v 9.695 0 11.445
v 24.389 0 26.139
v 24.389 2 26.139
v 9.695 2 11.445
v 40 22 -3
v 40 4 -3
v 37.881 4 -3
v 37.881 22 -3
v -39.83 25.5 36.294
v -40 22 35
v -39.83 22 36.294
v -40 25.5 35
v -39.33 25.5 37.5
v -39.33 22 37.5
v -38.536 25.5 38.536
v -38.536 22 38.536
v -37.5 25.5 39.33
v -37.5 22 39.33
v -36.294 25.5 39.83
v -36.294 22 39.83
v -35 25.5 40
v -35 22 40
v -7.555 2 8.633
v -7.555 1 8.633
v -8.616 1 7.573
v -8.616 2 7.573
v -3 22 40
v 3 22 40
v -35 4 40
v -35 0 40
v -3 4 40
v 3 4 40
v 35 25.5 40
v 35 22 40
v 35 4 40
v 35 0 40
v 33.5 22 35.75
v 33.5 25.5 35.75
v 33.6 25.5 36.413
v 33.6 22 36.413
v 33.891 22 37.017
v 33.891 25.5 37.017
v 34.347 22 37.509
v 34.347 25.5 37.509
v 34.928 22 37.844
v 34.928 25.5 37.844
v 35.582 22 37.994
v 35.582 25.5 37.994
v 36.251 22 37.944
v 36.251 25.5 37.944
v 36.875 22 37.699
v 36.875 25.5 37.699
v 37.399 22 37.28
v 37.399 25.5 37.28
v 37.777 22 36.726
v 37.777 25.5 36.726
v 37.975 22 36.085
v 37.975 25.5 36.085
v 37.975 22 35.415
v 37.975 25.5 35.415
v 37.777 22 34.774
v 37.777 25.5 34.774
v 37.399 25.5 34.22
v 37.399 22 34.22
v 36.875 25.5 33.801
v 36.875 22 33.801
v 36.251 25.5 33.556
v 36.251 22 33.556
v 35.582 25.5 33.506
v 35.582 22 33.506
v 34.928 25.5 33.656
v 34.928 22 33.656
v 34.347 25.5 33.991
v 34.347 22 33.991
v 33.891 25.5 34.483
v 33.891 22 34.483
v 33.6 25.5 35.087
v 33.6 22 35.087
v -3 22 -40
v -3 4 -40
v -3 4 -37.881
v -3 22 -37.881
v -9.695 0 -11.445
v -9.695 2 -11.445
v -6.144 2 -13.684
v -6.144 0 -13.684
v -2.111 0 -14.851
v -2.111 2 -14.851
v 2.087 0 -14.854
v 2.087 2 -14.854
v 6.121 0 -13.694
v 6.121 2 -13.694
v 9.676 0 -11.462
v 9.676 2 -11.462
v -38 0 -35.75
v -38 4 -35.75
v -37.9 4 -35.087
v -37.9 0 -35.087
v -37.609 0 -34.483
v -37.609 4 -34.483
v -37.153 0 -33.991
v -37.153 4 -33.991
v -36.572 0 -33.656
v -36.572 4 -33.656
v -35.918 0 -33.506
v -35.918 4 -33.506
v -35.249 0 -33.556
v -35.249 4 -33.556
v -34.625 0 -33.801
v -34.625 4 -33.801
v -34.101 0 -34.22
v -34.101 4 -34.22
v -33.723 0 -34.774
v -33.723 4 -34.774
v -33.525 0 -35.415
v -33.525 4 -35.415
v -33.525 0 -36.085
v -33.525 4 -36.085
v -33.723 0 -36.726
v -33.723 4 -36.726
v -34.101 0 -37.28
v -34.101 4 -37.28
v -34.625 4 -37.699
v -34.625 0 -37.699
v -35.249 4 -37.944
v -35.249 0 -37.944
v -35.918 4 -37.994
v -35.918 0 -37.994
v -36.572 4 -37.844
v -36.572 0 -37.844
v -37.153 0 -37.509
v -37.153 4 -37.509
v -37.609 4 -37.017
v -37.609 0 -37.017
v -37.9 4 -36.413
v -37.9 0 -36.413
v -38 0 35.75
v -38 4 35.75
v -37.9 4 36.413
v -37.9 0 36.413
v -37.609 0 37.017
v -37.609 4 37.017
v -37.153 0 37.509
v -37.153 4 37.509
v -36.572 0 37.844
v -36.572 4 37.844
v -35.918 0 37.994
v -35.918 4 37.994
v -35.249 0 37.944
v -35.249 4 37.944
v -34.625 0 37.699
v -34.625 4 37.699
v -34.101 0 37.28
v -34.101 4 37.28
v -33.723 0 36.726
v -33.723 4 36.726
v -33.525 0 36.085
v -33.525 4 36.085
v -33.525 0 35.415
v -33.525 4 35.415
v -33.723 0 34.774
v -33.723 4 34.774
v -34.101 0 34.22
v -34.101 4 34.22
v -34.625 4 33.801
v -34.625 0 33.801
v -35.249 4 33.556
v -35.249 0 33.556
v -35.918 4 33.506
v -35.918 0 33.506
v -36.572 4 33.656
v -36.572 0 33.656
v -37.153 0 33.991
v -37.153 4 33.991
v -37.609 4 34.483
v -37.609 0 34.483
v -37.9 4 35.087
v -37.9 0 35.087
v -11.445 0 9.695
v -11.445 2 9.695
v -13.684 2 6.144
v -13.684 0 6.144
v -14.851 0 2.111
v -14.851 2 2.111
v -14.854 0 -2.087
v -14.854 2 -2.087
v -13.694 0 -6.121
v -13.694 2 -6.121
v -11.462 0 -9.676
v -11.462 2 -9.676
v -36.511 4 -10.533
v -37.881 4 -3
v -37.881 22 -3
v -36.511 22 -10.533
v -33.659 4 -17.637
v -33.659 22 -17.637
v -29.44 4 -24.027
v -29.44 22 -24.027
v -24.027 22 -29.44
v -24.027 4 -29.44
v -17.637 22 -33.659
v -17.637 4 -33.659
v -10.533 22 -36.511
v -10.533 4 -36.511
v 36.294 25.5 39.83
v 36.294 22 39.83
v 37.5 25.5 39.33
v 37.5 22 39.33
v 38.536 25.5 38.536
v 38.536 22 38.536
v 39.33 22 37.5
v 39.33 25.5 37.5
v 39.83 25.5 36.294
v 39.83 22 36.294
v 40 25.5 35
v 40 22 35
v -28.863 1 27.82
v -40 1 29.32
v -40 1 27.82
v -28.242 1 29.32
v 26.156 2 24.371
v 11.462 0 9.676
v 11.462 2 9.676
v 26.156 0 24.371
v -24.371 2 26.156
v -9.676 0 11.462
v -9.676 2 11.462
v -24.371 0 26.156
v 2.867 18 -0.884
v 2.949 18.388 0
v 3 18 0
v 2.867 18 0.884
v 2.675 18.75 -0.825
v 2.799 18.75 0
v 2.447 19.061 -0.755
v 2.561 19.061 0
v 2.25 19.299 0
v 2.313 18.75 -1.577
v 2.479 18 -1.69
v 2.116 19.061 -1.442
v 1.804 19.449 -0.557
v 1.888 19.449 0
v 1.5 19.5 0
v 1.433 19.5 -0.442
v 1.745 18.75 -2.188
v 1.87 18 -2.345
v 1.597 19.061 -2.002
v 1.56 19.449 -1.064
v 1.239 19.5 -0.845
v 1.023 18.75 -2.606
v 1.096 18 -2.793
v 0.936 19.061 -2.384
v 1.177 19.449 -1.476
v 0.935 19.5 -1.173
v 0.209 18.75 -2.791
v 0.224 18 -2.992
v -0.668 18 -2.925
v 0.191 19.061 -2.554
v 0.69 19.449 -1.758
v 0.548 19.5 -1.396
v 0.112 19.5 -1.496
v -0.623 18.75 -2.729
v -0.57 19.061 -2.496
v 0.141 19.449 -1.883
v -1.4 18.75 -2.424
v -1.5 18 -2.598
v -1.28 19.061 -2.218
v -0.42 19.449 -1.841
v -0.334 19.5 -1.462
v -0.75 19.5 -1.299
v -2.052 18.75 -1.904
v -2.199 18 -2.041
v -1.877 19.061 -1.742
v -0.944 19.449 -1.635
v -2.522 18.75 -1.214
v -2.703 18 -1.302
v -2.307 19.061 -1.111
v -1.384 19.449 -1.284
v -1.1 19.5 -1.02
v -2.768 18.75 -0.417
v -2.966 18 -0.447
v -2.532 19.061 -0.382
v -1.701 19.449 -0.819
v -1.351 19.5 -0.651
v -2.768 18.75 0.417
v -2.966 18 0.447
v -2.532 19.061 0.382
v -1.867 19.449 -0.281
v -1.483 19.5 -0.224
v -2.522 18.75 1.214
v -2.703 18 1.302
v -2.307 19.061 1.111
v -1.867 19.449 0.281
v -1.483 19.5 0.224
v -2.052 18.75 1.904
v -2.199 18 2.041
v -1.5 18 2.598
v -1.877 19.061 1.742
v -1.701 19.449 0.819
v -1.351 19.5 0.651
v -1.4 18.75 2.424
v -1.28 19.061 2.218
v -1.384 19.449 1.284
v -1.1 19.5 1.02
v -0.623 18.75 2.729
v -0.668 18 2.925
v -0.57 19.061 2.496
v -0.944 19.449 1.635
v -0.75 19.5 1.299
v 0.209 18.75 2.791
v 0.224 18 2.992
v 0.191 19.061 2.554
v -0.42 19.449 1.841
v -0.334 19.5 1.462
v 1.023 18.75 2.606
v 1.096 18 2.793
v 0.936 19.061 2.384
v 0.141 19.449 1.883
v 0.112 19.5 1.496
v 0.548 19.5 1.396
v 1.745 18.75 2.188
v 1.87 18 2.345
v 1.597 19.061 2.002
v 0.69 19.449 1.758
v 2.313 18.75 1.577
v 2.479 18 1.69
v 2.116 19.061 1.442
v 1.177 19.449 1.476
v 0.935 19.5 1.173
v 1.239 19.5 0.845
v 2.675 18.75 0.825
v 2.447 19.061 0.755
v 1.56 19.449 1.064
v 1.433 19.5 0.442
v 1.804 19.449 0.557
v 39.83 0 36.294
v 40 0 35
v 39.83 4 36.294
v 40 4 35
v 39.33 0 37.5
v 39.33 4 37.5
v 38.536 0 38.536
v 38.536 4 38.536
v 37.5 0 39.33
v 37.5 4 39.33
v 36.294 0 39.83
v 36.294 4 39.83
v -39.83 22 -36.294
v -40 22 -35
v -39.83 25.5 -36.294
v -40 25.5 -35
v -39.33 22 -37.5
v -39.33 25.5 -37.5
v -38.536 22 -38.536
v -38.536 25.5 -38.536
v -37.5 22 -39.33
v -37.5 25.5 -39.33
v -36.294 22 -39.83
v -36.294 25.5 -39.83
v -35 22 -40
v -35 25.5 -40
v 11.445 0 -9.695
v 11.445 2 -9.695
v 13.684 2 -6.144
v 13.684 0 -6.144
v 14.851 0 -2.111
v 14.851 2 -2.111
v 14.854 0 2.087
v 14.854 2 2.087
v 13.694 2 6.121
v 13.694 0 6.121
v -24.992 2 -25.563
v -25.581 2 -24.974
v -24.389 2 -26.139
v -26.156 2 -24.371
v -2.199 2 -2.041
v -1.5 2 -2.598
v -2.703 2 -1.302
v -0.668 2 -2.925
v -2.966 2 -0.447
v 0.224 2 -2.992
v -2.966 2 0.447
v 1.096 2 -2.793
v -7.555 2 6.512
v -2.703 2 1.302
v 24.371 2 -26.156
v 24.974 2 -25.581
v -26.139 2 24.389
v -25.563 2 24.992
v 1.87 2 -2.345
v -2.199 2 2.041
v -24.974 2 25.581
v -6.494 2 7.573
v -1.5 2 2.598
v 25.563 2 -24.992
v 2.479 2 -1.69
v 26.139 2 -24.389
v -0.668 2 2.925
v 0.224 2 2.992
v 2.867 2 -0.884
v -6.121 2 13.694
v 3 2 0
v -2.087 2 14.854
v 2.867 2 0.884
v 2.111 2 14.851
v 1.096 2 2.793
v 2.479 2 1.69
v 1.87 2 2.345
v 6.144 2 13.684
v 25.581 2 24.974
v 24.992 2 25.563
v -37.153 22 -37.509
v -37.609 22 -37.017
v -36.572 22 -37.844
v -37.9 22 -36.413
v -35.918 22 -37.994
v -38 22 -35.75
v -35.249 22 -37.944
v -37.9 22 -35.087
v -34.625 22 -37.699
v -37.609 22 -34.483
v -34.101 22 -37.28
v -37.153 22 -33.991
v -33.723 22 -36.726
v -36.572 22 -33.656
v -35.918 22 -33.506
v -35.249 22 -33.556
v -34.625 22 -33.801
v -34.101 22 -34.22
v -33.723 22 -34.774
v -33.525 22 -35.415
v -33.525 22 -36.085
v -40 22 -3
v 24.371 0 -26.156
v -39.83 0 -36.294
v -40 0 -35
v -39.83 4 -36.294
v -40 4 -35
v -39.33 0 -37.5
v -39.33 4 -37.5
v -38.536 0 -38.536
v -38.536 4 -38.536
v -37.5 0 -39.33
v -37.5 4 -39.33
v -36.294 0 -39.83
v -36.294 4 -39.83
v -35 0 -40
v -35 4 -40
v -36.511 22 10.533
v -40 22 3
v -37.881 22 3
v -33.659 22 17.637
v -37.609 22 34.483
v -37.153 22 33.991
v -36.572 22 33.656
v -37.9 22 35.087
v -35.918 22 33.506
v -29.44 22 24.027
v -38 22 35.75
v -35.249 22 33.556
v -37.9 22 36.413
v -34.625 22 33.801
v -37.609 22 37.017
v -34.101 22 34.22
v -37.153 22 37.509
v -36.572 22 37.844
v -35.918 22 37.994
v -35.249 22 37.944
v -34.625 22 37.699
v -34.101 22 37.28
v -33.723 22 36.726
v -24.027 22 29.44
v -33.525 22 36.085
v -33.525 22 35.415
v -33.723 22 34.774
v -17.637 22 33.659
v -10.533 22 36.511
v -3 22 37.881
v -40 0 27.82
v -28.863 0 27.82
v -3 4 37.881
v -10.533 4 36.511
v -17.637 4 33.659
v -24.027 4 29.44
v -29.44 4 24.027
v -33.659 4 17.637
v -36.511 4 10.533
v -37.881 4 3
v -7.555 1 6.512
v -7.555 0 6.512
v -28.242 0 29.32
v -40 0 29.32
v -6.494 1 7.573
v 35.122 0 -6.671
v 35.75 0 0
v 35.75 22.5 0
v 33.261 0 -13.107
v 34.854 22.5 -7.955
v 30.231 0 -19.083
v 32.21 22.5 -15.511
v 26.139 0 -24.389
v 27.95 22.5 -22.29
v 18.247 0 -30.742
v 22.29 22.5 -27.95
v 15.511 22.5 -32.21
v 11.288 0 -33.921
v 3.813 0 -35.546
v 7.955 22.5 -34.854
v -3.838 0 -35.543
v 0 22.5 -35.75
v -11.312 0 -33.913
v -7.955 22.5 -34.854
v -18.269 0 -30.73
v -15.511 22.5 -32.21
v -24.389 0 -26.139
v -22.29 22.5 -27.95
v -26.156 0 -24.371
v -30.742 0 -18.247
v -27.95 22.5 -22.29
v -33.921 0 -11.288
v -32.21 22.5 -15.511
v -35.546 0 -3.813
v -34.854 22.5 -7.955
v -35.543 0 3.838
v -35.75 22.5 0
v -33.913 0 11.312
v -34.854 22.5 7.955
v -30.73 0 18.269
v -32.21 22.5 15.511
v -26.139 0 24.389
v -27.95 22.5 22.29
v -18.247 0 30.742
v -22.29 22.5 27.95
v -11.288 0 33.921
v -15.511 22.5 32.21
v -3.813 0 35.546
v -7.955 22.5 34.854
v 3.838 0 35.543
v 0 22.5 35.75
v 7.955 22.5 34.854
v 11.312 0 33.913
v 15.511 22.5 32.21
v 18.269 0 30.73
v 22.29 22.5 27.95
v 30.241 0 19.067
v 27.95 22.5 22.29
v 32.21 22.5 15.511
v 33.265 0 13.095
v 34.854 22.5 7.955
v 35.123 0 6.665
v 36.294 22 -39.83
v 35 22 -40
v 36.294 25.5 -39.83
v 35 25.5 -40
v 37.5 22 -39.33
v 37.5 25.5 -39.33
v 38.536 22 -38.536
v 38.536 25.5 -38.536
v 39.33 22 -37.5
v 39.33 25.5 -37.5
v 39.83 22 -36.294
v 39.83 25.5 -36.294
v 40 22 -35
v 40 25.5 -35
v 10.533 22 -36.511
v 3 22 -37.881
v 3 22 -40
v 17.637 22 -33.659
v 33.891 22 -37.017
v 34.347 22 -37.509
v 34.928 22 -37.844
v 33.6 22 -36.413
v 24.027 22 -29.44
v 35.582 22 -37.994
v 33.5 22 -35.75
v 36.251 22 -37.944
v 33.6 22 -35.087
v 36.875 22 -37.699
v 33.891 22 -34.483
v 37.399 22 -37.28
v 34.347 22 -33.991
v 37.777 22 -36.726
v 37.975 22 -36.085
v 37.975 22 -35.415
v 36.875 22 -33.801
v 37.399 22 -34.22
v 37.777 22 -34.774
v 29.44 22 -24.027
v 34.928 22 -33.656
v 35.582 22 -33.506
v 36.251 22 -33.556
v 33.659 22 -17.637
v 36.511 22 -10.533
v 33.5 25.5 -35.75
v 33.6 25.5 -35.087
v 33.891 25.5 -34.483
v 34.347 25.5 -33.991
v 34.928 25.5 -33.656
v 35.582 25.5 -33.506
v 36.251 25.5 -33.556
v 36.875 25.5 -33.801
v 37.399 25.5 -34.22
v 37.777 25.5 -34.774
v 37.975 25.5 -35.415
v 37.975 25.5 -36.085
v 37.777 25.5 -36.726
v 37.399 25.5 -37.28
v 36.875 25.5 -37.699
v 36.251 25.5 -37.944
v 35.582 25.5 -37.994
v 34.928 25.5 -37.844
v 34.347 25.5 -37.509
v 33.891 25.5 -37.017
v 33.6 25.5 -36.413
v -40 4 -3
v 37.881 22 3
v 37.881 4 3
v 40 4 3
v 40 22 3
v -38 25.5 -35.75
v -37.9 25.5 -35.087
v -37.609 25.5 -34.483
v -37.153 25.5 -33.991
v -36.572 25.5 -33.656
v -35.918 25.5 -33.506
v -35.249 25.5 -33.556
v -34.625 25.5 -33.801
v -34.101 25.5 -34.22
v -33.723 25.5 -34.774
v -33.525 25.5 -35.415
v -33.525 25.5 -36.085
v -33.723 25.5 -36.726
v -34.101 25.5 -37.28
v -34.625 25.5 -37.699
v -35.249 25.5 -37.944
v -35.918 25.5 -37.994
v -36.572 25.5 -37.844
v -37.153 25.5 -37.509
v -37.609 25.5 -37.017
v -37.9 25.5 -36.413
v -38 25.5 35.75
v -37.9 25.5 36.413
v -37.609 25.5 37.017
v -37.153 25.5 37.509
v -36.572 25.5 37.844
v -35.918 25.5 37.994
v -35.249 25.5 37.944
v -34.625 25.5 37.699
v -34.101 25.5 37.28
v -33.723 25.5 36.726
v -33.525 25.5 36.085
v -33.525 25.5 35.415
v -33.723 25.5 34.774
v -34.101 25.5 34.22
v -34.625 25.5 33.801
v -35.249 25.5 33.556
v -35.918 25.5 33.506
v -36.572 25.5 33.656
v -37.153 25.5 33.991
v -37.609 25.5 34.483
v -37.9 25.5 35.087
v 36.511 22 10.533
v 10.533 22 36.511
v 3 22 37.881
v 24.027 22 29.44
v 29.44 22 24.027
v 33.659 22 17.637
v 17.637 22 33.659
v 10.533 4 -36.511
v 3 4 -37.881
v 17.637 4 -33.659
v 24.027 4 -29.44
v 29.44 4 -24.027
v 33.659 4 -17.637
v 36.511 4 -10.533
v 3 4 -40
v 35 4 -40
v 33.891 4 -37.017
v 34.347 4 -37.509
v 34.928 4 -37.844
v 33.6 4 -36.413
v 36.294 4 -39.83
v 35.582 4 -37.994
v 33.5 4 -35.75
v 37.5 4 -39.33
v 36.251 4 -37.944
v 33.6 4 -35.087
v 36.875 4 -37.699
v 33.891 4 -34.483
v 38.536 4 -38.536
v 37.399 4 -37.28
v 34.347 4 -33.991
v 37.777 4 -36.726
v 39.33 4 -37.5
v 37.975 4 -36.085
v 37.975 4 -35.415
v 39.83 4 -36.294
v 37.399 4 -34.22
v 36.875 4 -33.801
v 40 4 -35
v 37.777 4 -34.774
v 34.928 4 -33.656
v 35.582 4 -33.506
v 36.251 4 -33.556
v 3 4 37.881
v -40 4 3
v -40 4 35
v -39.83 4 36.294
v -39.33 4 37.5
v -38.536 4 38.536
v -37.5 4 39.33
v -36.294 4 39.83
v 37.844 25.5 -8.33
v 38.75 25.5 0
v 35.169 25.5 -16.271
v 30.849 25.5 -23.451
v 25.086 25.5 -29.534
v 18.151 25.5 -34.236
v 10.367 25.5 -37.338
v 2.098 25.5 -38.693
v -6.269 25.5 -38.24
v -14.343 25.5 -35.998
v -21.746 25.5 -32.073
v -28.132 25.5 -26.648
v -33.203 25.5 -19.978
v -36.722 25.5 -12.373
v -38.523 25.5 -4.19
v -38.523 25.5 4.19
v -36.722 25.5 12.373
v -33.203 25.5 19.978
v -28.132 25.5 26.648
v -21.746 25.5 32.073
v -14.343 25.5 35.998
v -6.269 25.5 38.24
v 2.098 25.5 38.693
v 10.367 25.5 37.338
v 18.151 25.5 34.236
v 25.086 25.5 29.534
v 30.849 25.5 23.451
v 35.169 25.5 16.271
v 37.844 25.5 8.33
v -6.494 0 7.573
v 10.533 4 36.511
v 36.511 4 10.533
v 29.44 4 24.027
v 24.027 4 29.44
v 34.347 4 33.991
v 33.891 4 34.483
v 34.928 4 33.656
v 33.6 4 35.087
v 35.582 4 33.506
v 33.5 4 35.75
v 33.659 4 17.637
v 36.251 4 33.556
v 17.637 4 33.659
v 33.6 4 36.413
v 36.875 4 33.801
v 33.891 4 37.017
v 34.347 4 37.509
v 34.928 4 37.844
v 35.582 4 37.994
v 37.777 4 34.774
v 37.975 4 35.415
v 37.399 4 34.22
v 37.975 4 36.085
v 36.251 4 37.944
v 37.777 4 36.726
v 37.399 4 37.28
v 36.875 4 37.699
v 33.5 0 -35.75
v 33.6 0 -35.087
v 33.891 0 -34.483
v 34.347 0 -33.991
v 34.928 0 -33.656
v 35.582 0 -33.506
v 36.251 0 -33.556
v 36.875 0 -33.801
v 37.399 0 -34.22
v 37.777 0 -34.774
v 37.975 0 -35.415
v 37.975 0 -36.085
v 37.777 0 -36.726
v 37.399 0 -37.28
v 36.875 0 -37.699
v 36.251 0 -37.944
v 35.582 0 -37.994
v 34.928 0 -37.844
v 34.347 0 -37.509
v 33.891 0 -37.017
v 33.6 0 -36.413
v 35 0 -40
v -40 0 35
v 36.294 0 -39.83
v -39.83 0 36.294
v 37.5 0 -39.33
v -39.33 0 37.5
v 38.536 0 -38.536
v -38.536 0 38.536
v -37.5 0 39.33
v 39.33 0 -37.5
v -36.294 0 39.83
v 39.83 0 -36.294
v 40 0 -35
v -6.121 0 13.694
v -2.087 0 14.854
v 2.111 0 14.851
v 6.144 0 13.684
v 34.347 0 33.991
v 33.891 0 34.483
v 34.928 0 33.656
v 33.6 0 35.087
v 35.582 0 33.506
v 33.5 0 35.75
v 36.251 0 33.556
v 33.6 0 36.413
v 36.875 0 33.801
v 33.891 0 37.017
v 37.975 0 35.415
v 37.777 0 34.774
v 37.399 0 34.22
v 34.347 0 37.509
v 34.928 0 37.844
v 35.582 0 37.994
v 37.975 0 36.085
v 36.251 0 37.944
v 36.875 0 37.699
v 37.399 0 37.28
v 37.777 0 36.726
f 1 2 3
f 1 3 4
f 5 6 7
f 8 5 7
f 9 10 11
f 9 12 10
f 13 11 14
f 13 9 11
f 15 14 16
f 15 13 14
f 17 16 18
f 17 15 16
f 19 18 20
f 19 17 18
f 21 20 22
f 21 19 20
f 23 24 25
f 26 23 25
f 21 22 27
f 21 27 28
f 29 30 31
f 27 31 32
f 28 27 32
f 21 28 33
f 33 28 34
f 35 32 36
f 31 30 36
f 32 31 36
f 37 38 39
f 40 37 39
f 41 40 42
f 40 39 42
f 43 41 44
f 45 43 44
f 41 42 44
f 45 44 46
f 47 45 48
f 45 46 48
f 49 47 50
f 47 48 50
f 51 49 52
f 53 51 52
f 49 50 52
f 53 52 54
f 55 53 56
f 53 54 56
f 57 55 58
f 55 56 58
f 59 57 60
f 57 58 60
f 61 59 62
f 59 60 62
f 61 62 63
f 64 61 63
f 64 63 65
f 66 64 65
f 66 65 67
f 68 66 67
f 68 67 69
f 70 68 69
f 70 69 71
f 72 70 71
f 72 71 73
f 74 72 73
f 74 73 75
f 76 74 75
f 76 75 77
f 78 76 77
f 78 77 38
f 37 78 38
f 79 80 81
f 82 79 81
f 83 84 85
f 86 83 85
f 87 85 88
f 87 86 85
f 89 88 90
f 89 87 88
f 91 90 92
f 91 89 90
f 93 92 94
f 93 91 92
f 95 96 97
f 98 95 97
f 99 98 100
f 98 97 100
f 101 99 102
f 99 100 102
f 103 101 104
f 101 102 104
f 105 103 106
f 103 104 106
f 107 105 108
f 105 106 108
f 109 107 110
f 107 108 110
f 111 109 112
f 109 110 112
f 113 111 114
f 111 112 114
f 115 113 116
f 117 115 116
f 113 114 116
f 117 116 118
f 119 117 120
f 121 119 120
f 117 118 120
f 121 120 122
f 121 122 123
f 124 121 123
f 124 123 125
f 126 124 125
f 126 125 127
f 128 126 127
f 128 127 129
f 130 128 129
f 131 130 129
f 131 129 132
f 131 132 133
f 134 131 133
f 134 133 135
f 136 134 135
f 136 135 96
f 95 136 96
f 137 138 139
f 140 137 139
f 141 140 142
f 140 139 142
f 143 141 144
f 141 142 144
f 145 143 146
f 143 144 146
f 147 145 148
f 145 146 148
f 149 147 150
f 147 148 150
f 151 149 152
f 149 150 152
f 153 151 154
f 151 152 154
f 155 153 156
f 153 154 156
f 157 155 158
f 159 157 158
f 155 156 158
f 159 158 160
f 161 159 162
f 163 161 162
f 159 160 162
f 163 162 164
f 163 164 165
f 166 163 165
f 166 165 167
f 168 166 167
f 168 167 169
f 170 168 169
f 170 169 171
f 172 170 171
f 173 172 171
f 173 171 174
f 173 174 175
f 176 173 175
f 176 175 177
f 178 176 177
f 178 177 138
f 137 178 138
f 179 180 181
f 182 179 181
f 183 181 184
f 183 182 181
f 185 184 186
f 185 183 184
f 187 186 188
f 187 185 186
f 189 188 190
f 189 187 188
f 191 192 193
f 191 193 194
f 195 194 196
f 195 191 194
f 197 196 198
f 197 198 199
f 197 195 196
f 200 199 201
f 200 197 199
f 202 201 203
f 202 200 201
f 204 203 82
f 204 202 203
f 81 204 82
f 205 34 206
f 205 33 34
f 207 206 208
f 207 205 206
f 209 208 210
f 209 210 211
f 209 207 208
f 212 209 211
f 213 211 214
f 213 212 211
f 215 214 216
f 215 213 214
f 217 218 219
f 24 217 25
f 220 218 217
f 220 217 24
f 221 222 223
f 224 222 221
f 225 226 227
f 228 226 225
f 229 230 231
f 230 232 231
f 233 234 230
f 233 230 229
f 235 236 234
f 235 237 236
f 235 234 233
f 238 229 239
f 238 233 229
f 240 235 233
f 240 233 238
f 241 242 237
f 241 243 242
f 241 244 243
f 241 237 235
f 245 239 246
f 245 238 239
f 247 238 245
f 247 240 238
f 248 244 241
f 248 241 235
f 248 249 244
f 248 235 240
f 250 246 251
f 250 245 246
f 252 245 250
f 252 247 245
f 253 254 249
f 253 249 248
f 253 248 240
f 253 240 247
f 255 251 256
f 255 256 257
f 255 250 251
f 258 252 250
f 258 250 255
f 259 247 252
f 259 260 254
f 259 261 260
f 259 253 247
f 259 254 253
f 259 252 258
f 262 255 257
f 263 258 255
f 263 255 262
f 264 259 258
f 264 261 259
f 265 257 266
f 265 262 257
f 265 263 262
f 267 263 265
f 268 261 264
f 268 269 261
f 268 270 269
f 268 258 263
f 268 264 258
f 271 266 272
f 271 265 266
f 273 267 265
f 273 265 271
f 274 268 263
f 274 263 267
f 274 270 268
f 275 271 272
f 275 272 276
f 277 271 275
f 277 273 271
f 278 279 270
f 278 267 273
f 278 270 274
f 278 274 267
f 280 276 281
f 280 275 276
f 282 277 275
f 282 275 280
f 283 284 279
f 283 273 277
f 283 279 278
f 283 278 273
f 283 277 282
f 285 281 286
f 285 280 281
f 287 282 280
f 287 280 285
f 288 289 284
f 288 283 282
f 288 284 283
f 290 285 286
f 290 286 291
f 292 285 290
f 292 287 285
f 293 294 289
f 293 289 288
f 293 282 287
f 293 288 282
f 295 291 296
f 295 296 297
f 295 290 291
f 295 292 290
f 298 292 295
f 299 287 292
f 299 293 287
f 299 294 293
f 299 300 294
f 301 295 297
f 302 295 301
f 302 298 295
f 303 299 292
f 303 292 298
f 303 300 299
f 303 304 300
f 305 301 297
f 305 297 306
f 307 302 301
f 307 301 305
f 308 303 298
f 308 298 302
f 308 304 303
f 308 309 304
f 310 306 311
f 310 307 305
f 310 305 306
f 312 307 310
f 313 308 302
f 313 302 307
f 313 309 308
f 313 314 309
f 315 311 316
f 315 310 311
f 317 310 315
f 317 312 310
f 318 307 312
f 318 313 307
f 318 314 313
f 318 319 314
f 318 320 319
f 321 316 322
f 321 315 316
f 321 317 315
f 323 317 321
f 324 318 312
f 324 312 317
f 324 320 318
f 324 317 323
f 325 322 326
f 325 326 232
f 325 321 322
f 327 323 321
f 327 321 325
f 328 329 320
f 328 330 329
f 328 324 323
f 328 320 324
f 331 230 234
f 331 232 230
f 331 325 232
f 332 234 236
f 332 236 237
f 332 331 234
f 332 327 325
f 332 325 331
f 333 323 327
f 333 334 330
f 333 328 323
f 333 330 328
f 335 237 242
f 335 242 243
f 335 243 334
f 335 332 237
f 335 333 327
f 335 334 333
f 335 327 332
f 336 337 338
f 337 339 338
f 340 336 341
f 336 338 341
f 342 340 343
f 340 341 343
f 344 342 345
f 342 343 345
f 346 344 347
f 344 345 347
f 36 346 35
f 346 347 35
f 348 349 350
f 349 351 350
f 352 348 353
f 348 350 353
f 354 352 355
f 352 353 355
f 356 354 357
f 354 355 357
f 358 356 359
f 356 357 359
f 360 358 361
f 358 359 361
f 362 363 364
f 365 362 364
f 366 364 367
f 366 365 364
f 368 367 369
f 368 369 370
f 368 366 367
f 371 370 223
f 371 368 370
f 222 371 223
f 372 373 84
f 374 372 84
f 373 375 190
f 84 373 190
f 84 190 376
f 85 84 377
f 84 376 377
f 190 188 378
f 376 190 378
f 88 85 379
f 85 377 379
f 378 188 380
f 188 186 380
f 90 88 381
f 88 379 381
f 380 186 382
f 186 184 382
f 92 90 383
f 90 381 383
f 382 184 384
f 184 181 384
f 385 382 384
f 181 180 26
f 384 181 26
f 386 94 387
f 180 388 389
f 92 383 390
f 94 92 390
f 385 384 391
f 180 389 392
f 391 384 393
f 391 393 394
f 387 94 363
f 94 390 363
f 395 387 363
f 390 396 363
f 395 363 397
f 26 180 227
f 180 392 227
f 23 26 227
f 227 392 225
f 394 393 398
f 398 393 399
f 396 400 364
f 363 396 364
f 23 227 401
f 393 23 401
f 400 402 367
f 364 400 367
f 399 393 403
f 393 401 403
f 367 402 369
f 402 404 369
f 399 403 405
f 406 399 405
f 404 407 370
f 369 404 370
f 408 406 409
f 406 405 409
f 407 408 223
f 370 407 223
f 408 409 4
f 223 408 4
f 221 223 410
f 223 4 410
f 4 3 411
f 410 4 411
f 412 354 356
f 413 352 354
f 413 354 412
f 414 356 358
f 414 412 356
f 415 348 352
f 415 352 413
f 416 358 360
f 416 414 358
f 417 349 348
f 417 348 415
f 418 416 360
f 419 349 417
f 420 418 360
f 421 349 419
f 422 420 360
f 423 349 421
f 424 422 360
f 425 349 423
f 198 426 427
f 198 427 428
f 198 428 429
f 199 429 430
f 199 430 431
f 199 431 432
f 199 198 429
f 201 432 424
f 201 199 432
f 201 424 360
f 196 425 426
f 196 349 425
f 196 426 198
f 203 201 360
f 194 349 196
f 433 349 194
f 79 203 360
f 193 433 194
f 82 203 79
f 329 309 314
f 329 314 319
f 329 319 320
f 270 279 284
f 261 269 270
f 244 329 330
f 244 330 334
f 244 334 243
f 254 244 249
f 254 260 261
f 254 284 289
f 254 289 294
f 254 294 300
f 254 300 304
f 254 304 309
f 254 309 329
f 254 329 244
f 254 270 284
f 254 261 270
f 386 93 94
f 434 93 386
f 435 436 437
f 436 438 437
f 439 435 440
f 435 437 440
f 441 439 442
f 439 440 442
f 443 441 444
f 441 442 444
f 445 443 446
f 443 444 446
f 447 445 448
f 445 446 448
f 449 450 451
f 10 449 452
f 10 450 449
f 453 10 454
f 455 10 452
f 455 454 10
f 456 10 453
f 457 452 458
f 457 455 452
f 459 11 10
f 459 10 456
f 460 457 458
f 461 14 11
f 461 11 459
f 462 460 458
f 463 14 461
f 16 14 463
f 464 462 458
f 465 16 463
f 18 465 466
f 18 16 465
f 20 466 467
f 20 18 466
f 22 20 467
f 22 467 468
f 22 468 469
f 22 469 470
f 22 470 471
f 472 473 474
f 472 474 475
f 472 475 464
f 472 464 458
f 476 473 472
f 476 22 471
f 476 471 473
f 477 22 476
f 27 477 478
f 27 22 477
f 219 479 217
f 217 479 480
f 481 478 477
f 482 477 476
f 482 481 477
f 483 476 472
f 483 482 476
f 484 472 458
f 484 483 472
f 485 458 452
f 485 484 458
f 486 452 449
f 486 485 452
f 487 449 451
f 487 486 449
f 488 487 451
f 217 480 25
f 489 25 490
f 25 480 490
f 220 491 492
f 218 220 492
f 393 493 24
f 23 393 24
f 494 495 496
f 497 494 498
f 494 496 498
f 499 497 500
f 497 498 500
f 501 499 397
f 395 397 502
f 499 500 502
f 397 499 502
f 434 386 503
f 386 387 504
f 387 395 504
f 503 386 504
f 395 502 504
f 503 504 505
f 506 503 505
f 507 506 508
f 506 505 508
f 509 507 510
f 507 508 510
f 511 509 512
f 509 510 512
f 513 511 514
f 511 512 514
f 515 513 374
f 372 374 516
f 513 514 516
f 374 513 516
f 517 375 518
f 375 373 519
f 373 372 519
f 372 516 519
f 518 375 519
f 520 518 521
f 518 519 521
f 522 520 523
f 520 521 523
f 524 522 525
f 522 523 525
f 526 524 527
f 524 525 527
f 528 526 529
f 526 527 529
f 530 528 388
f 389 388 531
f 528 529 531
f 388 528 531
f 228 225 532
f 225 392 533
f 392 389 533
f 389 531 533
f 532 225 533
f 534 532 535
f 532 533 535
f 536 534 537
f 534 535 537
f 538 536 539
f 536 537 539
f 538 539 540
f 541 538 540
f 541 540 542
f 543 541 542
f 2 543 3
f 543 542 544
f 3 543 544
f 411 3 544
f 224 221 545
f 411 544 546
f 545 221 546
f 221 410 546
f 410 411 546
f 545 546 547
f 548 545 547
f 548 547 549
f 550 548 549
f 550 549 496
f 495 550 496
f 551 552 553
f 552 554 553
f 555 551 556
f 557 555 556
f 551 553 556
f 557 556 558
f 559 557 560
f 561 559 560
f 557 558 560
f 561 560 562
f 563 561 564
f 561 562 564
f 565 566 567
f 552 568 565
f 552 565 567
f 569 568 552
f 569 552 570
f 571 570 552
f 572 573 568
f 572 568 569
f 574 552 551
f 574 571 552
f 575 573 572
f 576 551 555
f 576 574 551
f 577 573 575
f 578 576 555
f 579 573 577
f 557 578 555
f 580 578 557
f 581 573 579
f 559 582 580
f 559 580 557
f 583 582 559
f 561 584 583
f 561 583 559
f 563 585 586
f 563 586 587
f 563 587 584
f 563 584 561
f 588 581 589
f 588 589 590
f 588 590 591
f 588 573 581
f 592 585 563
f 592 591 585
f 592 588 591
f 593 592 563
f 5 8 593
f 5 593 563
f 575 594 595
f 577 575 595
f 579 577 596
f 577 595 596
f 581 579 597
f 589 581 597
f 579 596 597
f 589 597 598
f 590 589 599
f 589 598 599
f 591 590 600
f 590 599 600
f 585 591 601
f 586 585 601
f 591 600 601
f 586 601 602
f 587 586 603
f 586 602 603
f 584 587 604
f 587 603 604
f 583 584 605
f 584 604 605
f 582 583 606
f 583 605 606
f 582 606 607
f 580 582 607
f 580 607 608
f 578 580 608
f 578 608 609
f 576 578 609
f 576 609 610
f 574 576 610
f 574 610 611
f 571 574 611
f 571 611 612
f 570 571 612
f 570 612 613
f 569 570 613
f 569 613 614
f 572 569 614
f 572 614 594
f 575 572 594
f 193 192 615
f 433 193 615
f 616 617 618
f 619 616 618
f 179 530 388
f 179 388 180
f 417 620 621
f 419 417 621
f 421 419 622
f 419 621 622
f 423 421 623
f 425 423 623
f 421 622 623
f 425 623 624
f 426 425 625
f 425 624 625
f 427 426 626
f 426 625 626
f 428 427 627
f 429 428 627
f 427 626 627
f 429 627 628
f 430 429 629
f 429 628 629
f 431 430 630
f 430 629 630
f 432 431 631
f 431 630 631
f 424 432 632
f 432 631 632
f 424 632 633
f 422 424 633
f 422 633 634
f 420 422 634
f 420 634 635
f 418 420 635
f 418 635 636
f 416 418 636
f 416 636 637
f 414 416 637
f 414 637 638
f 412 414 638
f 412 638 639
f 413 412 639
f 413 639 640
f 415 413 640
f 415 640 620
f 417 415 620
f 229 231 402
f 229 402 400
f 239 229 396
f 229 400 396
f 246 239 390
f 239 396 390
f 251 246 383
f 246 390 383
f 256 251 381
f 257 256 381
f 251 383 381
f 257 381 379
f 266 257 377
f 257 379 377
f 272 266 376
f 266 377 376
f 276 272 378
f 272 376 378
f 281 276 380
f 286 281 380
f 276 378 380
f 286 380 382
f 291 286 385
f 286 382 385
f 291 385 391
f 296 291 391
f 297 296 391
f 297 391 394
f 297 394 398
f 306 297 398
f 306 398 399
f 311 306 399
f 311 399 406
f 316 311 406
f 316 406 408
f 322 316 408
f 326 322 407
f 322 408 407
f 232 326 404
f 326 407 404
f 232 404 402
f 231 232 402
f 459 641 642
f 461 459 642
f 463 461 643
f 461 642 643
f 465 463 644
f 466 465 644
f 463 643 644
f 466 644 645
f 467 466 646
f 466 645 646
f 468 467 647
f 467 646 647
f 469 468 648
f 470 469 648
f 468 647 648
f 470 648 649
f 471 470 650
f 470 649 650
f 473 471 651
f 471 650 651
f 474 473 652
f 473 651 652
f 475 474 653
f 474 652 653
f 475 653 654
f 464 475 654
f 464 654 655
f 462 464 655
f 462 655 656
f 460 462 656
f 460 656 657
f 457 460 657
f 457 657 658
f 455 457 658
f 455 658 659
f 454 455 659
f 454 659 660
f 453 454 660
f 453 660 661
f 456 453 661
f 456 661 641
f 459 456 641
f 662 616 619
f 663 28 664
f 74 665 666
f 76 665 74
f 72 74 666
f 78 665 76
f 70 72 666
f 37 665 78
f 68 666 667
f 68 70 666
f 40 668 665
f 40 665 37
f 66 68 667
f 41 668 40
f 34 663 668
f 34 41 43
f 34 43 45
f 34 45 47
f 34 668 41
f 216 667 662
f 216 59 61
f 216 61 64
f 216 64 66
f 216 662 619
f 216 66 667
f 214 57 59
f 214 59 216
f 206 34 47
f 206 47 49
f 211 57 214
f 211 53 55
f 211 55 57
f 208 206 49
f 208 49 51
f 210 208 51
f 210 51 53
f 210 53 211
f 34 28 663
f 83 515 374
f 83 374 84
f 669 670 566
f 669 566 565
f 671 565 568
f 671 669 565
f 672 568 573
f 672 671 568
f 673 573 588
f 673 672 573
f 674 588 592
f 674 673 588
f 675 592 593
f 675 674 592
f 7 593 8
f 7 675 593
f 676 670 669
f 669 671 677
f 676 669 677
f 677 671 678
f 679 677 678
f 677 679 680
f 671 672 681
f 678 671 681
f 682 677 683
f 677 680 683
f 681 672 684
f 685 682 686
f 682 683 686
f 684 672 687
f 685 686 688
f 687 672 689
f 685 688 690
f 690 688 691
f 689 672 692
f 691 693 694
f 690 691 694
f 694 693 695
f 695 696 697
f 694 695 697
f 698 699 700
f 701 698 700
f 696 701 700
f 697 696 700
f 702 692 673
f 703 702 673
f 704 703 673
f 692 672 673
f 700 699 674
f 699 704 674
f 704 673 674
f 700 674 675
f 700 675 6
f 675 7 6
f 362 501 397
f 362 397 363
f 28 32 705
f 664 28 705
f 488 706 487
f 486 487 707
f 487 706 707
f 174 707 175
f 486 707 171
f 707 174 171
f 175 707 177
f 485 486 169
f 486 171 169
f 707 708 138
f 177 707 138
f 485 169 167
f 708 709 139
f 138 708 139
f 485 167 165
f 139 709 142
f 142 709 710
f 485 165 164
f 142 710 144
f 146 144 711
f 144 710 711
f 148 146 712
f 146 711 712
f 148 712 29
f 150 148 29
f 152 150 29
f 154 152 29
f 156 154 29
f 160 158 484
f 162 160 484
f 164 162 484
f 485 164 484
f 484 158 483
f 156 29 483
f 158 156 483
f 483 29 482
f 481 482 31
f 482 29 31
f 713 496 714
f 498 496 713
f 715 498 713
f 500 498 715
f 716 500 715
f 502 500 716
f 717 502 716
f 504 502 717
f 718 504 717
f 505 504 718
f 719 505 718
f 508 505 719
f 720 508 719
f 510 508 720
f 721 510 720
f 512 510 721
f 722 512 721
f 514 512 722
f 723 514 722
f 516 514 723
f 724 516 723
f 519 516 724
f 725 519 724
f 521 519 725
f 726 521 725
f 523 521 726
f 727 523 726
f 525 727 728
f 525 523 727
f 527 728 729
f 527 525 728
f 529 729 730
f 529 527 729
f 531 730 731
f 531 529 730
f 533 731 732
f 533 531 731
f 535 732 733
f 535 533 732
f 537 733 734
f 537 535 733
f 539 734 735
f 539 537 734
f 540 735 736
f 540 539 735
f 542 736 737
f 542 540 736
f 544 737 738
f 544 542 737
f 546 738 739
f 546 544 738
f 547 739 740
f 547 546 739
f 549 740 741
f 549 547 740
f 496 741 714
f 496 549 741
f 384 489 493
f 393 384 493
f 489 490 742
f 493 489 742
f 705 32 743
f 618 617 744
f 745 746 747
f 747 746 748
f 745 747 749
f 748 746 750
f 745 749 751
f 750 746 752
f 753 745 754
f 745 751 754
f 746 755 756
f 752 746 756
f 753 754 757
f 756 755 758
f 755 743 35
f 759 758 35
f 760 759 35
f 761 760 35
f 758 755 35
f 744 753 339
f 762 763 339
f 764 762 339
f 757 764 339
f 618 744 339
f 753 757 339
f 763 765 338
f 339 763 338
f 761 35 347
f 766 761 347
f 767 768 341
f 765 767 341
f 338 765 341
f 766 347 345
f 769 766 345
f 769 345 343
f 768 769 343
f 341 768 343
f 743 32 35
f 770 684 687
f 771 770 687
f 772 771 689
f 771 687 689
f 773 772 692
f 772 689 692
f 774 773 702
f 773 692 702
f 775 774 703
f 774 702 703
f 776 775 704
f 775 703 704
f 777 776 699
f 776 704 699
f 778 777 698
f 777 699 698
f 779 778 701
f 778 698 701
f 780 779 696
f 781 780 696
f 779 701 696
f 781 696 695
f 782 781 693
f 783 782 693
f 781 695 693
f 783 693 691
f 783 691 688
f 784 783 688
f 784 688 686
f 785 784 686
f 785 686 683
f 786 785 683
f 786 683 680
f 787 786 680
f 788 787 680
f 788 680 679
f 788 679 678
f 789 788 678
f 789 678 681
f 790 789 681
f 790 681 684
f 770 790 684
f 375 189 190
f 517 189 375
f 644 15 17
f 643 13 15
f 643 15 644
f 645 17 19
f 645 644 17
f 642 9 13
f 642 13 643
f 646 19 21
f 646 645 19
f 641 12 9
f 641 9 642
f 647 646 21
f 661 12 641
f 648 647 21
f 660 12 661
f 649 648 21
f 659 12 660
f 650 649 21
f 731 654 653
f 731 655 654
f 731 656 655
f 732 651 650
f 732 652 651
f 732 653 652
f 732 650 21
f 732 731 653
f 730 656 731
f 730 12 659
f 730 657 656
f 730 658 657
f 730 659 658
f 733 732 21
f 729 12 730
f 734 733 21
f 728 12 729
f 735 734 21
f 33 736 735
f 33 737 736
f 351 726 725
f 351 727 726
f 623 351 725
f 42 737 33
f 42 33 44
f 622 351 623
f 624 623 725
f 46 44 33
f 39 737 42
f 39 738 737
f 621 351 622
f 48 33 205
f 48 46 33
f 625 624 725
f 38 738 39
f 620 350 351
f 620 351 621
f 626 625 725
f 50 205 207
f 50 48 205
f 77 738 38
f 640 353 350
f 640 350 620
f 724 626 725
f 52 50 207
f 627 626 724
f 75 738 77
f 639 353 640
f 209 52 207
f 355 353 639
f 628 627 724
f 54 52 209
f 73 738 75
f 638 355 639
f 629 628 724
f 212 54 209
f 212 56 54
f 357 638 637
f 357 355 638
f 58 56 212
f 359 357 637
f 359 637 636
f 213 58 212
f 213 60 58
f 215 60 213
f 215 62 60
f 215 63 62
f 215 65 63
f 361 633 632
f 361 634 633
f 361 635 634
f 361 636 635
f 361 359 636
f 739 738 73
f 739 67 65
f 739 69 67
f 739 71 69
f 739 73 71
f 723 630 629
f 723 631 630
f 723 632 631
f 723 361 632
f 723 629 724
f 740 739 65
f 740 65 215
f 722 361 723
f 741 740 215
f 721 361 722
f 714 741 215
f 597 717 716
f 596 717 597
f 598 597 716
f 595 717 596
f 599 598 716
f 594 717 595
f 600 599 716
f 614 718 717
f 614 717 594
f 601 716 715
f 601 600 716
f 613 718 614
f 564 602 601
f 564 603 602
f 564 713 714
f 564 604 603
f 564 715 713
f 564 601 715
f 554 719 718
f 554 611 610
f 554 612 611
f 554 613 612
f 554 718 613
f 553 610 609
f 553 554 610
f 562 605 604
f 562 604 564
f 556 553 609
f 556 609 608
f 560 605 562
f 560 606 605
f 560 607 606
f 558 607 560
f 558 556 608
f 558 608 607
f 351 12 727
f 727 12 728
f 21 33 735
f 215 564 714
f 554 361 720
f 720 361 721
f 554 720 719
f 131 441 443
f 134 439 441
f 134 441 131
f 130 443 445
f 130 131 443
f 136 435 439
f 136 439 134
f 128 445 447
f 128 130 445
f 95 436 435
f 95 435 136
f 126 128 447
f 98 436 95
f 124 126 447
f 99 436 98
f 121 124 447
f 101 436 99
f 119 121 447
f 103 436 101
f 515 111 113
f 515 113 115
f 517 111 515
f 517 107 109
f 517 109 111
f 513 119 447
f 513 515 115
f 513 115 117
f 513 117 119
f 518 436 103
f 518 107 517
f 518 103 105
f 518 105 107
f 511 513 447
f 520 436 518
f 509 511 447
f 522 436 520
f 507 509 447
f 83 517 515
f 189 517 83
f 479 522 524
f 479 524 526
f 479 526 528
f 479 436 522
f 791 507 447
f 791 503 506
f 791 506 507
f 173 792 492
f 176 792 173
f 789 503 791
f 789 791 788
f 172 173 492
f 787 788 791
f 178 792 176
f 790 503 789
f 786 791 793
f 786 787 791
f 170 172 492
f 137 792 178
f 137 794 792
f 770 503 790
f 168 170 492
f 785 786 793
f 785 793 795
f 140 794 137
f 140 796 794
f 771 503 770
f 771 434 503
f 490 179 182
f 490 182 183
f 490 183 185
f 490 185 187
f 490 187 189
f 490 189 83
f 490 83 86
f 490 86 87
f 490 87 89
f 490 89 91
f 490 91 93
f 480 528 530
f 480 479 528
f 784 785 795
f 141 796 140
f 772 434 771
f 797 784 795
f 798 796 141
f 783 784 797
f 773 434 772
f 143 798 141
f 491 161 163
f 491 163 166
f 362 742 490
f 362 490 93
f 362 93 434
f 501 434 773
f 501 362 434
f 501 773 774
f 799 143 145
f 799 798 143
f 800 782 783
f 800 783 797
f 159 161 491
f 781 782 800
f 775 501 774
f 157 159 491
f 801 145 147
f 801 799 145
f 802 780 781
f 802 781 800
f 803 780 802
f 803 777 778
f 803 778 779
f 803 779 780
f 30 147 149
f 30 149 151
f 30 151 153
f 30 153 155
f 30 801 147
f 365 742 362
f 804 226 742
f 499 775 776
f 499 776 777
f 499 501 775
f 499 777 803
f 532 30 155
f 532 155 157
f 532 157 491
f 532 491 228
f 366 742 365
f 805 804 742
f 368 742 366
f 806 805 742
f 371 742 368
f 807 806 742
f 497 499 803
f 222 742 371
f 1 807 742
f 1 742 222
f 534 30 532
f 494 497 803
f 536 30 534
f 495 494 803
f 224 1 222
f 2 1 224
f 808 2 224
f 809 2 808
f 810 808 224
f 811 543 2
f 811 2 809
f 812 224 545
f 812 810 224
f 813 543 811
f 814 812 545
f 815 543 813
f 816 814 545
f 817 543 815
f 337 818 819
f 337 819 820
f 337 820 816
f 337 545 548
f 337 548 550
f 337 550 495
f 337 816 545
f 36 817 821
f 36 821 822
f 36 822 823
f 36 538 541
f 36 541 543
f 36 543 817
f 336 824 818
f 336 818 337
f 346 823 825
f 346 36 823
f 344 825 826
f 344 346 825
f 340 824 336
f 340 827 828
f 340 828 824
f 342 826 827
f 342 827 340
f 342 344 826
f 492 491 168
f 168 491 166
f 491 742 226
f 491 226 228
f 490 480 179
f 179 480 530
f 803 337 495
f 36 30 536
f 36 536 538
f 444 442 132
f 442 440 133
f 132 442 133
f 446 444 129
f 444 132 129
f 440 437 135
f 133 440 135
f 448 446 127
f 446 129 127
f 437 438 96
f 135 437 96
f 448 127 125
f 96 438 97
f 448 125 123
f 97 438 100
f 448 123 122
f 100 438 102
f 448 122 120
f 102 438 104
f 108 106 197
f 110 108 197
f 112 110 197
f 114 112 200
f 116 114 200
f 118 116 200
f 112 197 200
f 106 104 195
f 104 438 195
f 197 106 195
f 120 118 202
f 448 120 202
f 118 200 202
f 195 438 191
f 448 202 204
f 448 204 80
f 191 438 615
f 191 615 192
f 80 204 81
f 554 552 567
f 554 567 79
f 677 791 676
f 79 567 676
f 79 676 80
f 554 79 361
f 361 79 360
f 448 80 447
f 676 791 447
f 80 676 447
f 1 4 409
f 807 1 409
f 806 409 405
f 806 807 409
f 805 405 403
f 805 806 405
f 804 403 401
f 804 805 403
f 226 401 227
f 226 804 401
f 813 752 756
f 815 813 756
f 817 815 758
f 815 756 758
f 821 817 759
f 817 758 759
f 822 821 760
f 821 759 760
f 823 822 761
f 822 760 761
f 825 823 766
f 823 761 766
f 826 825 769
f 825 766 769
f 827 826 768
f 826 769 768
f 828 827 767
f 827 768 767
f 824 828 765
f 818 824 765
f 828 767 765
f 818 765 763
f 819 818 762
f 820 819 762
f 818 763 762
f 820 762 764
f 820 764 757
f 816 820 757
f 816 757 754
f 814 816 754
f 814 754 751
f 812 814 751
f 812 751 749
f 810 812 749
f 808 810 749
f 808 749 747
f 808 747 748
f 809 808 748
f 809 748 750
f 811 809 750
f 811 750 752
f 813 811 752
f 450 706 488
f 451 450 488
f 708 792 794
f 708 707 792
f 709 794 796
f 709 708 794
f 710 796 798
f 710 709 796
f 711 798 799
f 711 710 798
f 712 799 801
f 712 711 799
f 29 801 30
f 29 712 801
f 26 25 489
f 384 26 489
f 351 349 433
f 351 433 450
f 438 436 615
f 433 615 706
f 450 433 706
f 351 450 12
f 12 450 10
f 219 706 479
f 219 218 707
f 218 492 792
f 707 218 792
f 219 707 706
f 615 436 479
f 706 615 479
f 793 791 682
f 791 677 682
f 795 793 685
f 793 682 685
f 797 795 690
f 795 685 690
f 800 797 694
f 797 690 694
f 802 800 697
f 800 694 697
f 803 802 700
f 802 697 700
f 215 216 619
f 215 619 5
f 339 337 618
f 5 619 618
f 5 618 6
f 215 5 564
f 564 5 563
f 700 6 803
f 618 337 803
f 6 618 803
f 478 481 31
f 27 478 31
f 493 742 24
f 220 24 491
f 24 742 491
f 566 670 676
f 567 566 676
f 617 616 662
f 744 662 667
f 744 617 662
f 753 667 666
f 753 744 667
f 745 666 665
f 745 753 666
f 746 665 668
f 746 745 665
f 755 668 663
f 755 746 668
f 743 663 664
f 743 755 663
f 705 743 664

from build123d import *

# Parameters (mm, degrees)
SKETCH1_W            = 80
SKETCH1_H            = 80
BOSS_EXTRUDE1_DEPTH  = 25.5
SKETCH2_R            = 35.75
CUT_EXTRUDE2_DEPTH   = 28
BOSS_EXTRUDE2_DEPTH  = 2
CIRPATTERN2_COUNT    = 4
SKETCH5_R            = 15
BOSS_EXTRUDE3_DEPTH  = 2
SKETCH6_R            = 3
BOSS_EXTRUDE4_DEPTH  = 17.5
FILLET1_R            = 1.5
SKETCH7_R            = 70
SKETCH7_R_2          = 38
CUT_EXTRUDE4_DEPTH   = 18
FILLET2_R            = 5
BOSS_EXTRUDE5_DEPTH  = 20
CIRPATTERN3_COUNT    = 4
SKETCH9_R            = 2.25
CUT_EXTRUDE5_DEPTH   = 37
LPATTERN1_COUNT      = 2
LPATTERN1_PITCH      = 71.5
LPATTERN1_COUNT_DIR2 = 2
LPATTERN1_PITCH_DIR2 = 71.5
CHAMFER2_SIZE        = 3
CUT_EXTRUDE6_DEPTH   = 1
CUT_EXTRUDE7_DEPTH   = 7


with BuildPart() as part:
    # Sketch1 → Boss-Extrude1 (new body)
    with BuildSketch(Plane(origin=(0, 0, 0), x_dir=(1, 0, 0), z_dir=(0, 1, 0))):
        Rectangle(SKETCH1_W, SKETCH1_H)
    extrude(amount=BOSS_EXTRUDE1_DEPTH)

    # Sketch2 → Cut-Extrude2 (cut)
    with BuildSketch(Plane(origin=(0, 25.5, 0), x_dir=(1, 0, 0), z_dir=(0, 1, 0))):
        Circle(SKETCH2_R)
    extrude(amount=-CUT_EXTRUDE2_DEPTH, mode=Mode.SUBTRACT)

    # Sketch4 → Boss-Extrude2 (add)
    with BuildSketch(Plane.XZ):
        with BuildLine():
            Line((-1.75, 0), (0, 1.785533906))
            Line((0, 1.785533906), (-24.370530875, 26.156064781))
            ThreePointArc((-24.370530875, 26.156064781), (-25.270176953, 25.287954776), (-26.138919431, 24.388919431))
            Line((-26.138919431, 24.388919431), (-1.75, 0))
        make_face()
    boss_extrude2 = extrude(amount=-BOSS_EXTRUDE2_DEPTH)

    # CirPattern2: Boss-Extrude2 ×4 about axis
    cirpattern2_axis = Axis((0, 0, 0), (0, 1, 0))
    for i in range(1, CIRPATTERN2_COUNT):
        add(boss_extrude2.rotate(cirpattern2_axis, i * 360 / CIRPATTERN2_COUNT))

    # Sketch5 → Boss-Extrude3 (add)
    with BuildSketch(Plane.XZ):
        Circle(SKETCH5_R)
    extrude(amount=-BOSS_EXTRUDE3_DEPTH)

    # Sketch6 → Boss-Extrude4 (add)
    with BuildSketch(Plane(origin=(0, 2, 0), x_dir=(1, 0, 0), z_dir=(0, 1, 0))):
        Circle(SKETCH6_R)
    extrude(amount=BOSS_EXTRUDE4_DEPTH)

    # Fillet1
    fillet1_edges = [part.edges().sort_by_distance(p)[0] for p in [
        (-3, 19.5, 0),
    ]]
    fillet(fillet1_edges, radius=FILLET1_R)

    # Sketch7 → Cut-Extrude4 (cut)
    with BuildSketch(Plane.XZ.offset(-4)):
        Circle(SKETCH7_R)
        Circle(SKETCH7_R_2, mode=Mode.SUBTRACT)
    extrude(amount=-CUT_EXTRUDE4_DEPTH, mode=Mode.SUBTRACT)

    # Fillet2
    fillet2_edges = [part.edges().sort_by_distance(p)[0] for p in [
        (-40, 2, -40),
        (40, 2, -40),
        (40, 2, 40),
        (-40, 2, 40),
        (-40, 23.75, -40),
        (40, 23.75, -40),
        (40, 23.75, 40),
        (-40, 23.75, 40),
    ]]
    fillet(fillet2_edges, radius=FILLET2_R)

    # Sketch8 → Boss-Extrude5 (add)
    with BuildSketch(Plane.XZ.offset(-4)):
        with BuildLine():
            Line((-3, 40), (3, 40))
            Line((3, 40), (3, 35.623903492))
            ThreePointArc((3, 35.623903492), (0, 35.75), (-3, 35.623903492))
            Line((-3, 35.623903492), (-3, 40))
        make_face()
    boss_extrude5 = extrude(amount=-BOSS_EXTRUDE5_DEPTH)

    # CirPattern3: Boss-Extrude5 ×4 about axis
    cirpattern3_axis = Axis((0, 0, 0), (0, 1, 0))
    for i in range(1, CIRPATTERN3_COUNT):
        add(boss_extrude5.rotate(cirpattern3_axis, i * 360 / CIRPATTERN3_COUNT))

    # Sketch9 → Cut-Extrude5 (cut)
    with BuildSketch(Plane(origin=(0, 25.5, 0), x_dir=(-1, 0, 0), z_dir=(0, 1, 0))):
        with Locations((35.75, -35.75)):
            Circle(SKETCH9_R)
    cut_extrude5 = extrude(amount=-CUT_EXTRUDE5_DEPTH, mode=Mode.SUBTRACT)

    # LPattern1: Cut-Extrude5 2 × 2
    with Locations(*[(i * LPATTERN1_PITCH, 0, j * LPATTERN1_PITCH_DIR2) for i in range(LPATTERN1_COUNT) for j in range(LPATTERN1_COUNT_DIR2) if (i, j) != (0, 0)]):
        add(cut_extrude5, mode=Mode.SUBTRACT)

    # Chamfer2
    chamfer2_edges = [part.edges().sort_by_distance(p)[0] for p in [
        (-35.75, 25.5, 0),
    ]]
    chamfer(chamfer2_edges, length=CHAMFER2_SIZE)

    # Sketch11 → Cut-Extrude6 (cut)
    with BuildSketch(Plane.XZ):
        Polygon((-28.863216429, 27.820323211), (-7.554875149, 6.51198193), (-6.494214977, 7.572642102), (-28.241896086, 29.320323211), (-40, 29.320323211), (-40, 27.820323211), align=None)
    extrude(amount=-CUT_EXTRUDE6_DEPTH, mode=Mode.SUBTRACT)

    # Sketch12 → Cut-Extrude7 (cut)
    with BuildSketch(Plane.XZ.offset(-1)):
        Polygon((-6.494214977, 7.572642102), (-7.554875149, 8.633302273), (-8.61553532, 7.572642102), (-7.554875149, 6.51198193), align=None)
    extrude(amount=-CUT_EXTRUDE7_DEPTH, mode=Mode.SUBTRACT)


solid = part.part
